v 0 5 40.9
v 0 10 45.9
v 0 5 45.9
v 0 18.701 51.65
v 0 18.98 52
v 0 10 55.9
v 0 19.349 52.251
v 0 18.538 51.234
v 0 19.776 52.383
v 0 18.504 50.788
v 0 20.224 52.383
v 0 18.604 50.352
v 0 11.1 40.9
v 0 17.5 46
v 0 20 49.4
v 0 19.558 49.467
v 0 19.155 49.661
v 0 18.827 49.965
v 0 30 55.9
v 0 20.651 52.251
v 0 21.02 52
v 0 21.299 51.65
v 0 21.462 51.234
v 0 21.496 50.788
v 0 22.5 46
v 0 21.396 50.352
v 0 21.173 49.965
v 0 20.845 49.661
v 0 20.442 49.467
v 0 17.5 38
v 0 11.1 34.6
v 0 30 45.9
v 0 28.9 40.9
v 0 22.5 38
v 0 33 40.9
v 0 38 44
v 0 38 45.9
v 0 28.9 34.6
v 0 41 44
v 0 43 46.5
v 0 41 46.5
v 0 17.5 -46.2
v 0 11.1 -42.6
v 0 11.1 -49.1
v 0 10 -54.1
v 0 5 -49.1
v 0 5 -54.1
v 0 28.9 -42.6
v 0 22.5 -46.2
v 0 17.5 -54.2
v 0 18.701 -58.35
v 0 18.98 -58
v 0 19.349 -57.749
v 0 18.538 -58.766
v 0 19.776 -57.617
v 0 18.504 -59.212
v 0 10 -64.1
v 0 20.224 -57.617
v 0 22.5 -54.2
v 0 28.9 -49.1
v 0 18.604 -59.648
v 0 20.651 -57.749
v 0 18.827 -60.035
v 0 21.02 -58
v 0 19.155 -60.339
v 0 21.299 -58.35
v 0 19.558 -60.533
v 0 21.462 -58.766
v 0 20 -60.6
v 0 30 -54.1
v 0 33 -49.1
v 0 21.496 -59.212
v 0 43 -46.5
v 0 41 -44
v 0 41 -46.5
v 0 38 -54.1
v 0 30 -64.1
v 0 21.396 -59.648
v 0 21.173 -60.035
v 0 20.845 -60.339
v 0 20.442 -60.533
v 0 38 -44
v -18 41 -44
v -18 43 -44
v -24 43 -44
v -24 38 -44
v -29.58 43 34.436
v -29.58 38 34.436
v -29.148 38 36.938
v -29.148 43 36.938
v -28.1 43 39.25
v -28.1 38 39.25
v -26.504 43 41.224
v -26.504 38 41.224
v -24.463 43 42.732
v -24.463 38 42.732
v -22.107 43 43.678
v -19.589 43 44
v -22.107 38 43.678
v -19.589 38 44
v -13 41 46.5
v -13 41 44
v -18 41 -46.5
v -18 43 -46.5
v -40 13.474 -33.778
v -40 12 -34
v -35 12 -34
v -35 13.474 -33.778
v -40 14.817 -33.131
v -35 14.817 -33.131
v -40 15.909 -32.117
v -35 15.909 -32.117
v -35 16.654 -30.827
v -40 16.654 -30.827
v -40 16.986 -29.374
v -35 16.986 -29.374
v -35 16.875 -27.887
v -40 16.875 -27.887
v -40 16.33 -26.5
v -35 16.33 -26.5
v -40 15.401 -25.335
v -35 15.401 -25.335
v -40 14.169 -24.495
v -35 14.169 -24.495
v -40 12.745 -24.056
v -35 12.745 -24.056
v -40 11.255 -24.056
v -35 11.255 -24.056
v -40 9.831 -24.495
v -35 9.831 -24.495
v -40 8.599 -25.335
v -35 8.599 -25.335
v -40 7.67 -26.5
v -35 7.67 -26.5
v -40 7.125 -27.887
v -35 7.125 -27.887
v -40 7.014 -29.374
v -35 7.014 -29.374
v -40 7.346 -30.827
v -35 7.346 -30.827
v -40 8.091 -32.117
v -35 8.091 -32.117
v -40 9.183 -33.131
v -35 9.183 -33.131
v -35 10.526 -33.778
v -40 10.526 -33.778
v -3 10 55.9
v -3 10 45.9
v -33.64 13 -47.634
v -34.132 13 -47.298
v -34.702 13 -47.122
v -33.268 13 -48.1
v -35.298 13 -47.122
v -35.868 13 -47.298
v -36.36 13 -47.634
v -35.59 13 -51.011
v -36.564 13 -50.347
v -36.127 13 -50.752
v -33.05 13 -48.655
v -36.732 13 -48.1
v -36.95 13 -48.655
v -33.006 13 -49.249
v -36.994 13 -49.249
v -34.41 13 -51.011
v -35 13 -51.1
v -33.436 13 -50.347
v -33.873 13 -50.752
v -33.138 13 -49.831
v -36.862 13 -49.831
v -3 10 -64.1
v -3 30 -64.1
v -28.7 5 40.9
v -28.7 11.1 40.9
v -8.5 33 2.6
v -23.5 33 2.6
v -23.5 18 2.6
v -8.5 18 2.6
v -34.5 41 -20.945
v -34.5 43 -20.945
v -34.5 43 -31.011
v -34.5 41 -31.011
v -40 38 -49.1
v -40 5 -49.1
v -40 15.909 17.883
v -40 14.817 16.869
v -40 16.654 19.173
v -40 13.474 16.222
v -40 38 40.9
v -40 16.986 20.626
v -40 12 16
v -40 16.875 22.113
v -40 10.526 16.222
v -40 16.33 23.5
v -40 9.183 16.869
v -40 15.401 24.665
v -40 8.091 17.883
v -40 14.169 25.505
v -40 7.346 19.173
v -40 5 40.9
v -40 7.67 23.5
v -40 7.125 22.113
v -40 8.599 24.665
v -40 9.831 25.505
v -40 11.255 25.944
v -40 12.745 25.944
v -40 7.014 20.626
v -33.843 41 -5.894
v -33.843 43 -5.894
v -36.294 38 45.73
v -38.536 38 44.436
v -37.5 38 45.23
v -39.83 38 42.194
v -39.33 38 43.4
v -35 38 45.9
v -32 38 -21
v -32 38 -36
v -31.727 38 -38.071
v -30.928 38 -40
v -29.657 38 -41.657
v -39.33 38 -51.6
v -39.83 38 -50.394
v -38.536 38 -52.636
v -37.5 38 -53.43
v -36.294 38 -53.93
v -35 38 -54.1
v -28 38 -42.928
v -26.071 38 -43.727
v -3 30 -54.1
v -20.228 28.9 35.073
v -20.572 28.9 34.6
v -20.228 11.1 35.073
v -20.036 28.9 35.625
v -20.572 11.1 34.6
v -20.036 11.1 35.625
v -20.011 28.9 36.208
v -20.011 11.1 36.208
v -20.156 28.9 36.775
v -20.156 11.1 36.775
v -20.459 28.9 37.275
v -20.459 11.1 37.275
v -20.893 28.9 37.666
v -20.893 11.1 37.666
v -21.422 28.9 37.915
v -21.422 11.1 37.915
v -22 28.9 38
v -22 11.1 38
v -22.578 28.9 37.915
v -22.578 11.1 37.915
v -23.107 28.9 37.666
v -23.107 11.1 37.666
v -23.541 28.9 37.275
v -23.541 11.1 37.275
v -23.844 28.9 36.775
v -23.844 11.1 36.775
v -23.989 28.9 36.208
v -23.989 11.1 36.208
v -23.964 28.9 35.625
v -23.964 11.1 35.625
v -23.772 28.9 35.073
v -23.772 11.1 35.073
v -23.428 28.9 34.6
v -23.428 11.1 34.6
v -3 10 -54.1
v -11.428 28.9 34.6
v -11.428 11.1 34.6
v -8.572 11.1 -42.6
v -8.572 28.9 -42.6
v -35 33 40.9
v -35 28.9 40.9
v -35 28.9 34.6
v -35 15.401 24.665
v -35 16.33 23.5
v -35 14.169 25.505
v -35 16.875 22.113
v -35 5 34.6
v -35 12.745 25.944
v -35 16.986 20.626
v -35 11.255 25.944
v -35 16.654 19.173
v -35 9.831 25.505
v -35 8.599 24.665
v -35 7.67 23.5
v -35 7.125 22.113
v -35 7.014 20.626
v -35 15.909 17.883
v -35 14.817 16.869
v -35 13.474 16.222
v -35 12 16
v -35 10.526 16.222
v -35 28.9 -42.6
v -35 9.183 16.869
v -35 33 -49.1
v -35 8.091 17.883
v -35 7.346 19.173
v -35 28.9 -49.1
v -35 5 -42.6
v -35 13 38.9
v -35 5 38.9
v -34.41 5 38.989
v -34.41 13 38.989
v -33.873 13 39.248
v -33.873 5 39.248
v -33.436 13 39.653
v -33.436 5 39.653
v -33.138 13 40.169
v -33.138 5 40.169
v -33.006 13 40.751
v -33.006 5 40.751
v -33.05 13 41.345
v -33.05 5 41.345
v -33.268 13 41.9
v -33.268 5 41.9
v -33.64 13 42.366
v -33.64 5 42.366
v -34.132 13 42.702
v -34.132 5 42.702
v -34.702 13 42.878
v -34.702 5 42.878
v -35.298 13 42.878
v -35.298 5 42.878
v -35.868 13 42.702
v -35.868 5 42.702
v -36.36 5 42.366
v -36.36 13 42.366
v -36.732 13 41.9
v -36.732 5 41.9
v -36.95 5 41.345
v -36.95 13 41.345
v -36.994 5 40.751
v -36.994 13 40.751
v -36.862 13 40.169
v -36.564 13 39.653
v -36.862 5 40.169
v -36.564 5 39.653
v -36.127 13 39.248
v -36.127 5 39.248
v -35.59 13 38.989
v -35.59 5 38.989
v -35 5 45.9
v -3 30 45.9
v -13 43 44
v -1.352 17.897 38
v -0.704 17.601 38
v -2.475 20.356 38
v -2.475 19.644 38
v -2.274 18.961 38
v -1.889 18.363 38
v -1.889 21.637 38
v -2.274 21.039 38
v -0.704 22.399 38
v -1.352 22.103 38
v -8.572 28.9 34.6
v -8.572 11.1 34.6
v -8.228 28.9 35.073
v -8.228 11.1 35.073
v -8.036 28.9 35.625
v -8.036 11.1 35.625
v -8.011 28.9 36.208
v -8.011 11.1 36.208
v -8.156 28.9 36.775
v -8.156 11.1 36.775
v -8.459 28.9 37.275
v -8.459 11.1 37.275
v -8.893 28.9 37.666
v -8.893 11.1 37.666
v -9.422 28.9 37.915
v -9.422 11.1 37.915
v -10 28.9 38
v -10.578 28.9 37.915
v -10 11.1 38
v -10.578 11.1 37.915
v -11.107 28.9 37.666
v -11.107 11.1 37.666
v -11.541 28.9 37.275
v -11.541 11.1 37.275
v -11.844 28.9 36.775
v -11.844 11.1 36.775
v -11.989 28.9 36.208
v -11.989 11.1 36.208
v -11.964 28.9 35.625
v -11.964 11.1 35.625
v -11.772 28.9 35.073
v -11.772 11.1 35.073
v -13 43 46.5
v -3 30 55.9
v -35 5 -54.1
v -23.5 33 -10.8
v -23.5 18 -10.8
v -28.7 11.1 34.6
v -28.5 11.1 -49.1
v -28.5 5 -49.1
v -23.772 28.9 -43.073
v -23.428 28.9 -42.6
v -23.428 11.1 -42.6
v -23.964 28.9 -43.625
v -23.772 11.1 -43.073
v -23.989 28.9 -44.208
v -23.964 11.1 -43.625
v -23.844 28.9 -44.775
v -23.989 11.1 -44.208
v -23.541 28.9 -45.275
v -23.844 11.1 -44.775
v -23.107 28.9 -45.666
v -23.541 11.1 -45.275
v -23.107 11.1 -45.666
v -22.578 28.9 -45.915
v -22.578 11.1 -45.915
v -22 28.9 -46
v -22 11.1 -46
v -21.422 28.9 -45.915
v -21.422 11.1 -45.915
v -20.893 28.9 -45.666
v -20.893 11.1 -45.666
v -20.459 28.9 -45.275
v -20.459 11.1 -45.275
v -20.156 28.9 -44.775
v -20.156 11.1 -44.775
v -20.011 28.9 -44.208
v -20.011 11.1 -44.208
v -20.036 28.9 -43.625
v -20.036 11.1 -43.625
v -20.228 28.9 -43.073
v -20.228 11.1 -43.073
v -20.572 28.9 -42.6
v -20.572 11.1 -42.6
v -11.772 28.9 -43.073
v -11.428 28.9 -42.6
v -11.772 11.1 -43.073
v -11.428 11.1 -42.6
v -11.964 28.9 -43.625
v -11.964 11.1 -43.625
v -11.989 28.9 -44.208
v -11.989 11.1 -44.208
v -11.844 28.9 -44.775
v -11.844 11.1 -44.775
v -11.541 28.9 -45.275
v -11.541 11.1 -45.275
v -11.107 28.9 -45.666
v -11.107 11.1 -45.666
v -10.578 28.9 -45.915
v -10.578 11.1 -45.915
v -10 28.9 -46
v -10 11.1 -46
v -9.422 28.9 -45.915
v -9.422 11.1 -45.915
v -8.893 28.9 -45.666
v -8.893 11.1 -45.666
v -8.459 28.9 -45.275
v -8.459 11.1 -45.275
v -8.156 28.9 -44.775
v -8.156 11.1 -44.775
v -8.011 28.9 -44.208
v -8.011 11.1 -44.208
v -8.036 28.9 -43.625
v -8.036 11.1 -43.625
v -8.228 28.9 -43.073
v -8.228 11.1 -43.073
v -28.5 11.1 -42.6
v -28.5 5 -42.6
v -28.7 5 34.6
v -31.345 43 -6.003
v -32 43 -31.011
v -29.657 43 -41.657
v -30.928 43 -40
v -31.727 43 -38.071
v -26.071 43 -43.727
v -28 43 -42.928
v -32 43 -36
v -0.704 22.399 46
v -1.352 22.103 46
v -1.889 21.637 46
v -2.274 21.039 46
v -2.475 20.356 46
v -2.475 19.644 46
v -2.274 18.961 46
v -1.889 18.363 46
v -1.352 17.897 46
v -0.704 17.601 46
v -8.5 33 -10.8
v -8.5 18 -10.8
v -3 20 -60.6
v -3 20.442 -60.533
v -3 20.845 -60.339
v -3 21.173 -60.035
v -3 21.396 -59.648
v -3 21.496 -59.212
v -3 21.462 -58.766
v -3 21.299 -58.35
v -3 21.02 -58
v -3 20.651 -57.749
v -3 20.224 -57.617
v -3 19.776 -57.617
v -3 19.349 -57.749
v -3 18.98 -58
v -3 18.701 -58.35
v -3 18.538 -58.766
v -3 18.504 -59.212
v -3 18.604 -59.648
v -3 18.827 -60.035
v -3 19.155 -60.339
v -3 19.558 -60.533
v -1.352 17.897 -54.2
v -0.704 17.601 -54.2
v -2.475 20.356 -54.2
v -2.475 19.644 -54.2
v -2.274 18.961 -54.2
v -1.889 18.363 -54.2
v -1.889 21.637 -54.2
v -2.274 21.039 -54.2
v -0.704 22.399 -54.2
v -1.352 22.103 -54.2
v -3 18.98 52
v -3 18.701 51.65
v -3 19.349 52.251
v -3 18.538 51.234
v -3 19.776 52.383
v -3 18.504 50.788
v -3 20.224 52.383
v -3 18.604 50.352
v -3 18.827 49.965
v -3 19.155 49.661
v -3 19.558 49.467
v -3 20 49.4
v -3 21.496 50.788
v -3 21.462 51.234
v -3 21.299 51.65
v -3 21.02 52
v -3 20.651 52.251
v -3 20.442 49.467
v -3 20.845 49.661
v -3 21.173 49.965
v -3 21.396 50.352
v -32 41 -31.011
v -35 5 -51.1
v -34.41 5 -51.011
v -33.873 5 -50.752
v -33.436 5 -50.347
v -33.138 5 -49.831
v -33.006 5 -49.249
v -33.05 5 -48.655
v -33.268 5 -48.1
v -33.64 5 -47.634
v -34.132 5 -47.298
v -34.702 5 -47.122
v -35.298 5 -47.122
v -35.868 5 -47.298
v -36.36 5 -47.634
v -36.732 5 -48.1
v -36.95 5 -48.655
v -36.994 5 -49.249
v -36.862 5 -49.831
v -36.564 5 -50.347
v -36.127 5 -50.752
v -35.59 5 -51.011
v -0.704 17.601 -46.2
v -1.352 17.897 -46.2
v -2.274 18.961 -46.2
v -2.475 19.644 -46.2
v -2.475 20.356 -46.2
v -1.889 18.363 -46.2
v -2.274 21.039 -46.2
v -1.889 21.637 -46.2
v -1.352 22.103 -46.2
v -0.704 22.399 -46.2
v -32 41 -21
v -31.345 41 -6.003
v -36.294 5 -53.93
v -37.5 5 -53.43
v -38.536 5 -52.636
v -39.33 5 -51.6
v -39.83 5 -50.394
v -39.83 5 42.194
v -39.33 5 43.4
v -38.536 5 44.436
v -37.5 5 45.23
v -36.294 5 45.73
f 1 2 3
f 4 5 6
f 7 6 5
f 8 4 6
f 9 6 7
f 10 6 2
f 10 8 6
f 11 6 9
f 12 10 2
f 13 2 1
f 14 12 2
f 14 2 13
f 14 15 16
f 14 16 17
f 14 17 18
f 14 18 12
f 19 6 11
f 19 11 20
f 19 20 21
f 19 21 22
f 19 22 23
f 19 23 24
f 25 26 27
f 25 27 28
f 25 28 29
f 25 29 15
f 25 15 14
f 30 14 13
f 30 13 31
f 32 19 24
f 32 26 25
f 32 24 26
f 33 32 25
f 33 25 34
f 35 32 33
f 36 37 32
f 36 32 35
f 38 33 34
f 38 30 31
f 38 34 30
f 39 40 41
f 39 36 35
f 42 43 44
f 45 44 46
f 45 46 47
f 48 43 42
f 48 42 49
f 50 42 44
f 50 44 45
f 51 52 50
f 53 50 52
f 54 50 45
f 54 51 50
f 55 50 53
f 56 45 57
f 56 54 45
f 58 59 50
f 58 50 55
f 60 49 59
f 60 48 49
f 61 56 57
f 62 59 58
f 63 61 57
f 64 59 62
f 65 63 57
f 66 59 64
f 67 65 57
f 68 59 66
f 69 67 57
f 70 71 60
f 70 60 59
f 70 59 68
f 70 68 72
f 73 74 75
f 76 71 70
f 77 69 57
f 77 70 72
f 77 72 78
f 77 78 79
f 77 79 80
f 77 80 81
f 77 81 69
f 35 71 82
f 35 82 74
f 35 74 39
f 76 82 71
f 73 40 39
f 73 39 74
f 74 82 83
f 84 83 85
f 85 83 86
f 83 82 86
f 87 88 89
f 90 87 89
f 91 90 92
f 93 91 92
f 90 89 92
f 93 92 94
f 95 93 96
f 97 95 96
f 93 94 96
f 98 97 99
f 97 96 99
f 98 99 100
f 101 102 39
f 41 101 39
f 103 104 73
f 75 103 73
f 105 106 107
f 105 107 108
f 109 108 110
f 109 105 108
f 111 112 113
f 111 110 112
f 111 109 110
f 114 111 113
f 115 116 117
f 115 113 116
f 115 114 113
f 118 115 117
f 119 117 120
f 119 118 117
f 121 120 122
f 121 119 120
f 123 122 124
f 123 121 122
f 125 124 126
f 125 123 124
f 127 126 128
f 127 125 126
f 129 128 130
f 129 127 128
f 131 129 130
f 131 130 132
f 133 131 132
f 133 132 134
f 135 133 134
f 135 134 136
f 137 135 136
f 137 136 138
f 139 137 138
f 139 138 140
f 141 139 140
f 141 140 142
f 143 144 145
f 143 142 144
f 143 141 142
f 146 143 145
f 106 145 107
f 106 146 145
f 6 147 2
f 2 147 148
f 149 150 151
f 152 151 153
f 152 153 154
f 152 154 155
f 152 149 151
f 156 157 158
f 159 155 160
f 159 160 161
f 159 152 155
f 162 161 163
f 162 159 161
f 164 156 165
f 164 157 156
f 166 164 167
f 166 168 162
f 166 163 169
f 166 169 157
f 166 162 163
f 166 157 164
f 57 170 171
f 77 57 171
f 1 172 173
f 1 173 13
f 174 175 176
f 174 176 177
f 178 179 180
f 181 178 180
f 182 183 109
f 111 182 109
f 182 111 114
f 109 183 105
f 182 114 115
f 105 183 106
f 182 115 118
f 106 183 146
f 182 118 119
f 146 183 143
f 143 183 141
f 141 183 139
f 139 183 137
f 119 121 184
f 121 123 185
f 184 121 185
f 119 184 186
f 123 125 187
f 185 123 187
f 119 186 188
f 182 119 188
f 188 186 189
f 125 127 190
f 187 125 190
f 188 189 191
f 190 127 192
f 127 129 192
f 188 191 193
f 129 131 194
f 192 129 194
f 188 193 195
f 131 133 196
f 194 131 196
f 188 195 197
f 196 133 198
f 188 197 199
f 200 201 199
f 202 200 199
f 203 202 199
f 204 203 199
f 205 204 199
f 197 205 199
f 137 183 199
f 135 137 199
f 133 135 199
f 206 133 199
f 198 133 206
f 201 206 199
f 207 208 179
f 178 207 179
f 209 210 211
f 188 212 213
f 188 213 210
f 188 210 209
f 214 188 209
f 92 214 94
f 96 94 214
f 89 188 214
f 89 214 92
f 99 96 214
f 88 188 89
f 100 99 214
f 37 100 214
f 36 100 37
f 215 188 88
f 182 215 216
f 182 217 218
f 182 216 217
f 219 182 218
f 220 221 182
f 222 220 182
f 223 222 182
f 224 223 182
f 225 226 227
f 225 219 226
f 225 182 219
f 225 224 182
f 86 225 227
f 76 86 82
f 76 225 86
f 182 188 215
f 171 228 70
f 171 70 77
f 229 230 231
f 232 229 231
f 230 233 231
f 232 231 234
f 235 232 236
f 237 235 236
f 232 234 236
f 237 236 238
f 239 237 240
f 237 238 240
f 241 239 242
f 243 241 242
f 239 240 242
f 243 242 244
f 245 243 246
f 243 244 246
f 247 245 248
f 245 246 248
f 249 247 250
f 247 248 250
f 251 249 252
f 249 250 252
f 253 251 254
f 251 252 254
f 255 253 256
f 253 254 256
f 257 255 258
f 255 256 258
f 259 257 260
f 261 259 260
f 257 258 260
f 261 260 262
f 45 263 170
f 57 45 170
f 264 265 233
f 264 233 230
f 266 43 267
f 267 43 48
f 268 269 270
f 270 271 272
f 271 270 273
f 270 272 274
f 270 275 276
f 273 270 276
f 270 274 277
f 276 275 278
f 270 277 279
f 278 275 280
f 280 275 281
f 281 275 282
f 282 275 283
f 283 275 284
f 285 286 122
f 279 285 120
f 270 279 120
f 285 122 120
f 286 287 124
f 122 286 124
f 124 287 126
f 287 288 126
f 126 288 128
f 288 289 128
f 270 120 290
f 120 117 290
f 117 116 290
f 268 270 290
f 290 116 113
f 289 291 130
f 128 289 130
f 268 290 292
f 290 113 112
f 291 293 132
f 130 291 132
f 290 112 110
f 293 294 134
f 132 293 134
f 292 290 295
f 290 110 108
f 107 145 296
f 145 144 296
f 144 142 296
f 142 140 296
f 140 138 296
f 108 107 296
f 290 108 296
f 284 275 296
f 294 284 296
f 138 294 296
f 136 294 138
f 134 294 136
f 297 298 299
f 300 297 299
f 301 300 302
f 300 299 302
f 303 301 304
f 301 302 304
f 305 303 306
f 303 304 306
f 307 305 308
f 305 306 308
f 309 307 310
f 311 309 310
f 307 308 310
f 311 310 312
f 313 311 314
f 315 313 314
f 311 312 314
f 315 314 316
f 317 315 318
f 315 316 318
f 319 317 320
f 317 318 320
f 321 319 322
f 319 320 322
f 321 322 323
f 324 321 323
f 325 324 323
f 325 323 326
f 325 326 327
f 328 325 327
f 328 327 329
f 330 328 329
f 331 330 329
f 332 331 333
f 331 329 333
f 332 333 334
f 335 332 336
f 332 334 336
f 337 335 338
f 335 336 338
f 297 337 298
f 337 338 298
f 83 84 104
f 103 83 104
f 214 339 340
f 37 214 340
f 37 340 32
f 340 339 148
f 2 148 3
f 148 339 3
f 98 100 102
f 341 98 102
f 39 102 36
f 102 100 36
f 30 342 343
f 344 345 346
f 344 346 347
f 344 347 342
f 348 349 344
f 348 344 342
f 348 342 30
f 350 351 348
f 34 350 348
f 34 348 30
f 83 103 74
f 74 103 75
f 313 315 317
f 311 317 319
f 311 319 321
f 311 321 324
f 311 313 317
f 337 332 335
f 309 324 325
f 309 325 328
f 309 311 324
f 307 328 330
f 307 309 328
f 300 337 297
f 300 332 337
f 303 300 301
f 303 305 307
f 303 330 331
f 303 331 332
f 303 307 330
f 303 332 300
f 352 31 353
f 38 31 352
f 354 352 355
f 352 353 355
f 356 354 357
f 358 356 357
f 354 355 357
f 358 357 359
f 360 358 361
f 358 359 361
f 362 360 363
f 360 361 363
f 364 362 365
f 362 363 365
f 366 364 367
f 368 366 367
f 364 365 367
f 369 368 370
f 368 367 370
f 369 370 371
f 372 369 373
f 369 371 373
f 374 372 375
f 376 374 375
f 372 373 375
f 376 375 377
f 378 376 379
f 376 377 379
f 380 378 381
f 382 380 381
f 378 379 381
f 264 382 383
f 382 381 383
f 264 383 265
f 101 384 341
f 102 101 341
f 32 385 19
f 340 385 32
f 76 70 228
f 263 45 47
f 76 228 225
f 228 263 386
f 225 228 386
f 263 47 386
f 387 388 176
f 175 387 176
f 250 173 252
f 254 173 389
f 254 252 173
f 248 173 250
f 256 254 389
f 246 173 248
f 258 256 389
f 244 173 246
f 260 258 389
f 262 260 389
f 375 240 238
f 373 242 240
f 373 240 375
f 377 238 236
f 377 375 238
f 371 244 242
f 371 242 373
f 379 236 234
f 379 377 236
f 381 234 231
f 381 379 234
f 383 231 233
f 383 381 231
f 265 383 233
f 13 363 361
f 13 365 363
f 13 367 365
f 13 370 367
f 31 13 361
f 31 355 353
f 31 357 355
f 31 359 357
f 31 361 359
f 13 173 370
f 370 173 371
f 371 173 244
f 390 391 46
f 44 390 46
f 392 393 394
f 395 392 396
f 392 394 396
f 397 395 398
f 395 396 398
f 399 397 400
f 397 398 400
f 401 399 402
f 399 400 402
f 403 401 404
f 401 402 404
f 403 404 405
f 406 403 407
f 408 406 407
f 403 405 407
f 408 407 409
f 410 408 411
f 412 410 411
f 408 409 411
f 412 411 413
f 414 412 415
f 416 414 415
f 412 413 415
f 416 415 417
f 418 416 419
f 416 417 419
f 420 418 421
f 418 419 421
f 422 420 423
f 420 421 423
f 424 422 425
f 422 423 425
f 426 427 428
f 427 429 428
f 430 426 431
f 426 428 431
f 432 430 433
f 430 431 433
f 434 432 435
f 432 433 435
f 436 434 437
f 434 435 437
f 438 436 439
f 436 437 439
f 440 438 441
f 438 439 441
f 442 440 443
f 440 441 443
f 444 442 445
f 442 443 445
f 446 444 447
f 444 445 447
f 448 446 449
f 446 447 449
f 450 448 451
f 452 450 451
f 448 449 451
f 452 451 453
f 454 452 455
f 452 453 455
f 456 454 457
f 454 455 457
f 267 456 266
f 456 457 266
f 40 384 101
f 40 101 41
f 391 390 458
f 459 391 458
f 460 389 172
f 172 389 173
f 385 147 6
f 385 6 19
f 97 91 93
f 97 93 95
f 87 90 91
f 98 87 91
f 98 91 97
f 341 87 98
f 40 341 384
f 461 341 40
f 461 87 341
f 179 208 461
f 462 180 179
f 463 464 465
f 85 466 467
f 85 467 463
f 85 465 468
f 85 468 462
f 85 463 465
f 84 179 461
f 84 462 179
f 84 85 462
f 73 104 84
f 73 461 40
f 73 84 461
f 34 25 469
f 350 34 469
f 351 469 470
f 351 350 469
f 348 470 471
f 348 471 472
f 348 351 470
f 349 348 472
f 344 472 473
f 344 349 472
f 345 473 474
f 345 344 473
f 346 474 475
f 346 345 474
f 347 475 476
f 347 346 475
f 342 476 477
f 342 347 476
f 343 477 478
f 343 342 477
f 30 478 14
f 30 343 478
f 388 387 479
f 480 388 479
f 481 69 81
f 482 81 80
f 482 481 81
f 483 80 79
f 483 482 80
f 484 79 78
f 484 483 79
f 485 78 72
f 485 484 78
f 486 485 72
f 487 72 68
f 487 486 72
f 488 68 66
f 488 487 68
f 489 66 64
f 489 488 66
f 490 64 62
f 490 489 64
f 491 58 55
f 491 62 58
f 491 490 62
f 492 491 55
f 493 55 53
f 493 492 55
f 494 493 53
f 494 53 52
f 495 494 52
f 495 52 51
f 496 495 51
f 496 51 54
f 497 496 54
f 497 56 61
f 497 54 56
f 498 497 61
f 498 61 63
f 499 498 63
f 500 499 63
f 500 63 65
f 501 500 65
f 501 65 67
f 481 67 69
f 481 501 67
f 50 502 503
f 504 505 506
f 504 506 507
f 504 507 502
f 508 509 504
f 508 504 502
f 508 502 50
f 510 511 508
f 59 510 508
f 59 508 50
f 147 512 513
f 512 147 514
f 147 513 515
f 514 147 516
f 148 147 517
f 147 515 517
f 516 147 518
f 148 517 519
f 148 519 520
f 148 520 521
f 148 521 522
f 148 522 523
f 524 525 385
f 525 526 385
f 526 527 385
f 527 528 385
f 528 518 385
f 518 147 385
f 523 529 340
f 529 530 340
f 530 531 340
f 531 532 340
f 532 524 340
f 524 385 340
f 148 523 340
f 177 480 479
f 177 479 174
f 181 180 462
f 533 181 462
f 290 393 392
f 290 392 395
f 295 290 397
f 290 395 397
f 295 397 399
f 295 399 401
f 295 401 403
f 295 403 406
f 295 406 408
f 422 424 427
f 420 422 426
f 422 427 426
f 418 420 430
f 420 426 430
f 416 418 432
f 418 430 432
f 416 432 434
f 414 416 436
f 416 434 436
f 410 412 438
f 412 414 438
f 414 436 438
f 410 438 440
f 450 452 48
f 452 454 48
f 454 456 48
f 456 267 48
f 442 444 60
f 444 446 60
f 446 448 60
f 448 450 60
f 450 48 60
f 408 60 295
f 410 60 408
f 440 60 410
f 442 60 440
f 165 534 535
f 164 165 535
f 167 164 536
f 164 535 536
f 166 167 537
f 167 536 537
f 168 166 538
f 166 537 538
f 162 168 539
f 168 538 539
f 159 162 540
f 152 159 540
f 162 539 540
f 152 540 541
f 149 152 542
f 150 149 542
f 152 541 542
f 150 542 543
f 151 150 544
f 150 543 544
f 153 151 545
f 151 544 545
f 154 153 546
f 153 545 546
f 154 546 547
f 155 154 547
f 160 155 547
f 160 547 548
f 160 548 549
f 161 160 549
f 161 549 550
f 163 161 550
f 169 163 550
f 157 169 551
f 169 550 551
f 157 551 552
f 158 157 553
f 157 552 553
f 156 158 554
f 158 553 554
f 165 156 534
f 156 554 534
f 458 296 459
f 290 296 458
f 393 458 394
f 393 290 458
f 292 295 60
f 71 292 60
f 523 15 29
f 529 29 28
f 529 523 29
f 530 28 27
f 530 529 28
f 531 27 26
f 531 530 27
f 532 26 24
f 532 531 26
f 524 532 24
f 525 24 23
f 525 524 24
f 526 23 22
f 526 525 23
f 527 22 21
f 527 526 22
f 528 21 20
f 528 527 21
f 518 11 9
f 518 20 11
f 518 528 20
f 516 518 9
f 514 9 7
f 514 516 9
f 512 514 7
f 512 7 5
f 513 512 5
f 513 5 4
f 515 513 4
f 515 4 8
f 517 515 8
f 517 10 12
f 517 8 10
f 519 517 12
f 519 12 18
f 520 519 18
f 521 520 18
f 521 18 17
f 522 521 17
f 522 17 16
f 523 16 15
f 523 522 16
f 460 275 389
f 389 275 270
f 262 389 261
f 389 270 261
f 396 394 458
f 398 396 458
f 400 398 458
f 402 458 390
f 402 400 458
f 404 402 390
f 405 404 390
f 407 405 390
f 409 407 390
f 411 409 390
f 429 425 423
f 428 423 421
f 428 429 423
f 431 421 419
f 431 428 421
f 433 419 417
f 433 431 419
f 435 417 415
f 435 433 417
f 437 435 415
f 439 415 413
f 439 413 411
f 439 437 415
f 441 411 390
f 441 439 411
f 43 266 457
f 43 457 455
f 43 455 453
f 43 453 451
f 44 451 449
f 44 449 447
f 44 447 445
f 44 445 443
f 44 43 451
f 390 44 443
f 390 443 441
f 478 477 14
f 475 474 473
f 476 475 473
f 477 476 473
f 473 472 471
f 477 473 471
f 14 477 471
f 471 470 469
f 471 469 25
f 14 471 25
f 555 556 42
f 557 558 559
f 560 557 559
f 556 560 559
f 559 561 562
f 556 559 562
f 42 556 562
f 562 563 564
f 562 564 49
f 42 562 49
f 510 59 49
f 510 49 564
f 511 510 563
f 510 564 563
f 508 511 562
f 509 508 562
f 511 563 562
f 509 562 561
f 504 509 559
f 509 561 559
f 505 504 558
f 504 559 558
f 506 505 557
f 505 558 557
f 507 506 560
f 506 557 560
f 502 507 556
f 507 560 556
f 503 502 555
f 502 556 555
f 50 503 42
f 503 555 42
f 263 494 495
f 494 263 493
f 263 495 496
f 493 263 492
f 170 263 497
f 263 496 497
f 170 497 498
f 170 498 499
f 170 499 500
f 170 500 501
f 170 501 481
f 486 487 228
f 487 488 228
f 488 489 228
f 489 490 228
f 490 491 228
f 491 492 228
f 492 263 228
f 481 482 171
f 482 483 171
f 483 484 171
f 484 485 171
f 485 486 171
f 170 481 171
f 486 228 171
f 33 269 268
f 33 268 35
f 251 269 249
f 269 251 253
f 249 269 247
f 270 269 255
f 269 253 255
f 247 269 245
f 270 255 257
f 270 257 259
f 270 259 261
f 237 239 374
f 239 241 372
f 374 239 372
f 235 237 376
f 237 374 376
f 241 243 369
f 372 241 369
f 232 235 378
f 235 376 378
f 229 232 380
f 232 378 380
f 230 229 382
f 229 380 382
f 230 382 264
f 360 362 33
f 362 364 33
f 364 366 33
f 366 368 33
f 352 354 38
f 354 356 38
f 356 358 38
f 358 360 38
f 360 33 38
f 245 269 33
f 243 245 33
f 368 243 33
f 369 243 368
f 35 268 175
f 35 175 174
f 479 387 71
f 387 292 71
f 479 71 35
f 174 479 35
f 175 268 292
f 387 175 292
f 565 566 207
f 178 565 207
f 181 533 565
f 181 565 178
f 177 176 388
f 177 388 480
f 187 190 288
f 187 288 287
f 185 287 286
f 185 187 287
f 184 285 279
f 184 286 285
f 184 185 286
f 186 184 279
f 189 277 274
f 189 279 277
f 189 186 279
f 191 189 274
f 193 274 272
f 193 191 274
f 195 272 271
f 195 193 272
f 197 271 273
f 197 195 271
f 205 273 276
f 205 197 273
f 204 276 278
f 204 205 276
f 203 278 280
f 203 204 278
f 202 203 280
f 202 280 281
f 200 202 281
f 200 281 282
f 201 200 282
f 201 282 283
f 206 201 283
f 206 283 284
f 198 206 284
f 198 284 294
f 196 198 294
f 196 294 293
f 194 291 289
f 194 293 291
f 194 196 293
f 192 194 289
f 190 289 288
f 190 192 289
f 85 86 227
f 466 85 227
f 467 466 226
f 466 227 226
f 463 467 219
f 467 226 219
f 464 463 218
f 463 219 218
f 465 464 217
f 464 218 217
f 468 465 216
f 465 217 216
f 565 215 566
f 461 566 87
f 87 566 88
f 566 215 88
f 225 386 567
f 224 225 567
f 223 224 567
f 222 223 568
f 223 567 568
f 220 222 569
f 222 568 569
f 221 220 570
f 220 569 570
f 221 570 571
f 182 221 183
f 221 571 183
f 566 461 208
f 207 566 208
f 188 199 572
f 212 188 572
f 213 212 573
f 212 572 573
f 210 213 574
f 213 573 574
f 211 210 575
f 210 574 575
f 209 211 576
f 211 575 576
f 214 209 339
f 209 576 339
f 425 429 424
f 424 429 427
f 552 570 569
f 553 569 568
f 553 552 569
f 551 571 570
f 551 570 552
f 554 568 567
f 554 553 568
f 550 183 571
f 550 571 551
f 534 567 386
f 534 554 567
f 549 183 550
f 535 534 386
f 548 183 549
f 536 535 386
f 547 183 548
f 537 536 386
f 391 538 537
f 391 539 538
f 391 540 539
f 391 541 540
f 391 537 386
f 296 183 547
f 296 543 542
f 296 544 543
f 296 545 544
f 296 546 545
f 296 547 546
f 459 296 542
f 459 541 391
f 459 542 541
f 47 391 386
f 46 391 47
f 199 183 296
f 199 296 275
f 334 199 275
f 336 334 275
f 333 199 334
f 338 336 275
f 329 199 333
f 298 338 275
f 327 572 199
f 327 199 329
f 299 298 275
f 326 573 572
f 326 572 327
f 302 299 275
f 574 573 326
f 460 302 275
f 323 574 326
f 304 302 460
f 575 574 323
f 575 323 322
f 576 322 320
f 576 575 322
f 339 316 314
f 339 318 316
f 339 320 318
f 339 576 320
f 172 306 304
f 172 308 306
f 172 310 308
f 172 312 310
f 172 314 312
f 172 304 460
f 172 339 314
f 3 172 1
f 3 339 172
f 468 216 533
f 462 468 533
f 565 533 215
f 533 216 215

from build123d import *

# Parameters (mm, degrees)
SKETCH8_R                        = 10
BOSS_EXTRUDE6_DEPTH              = 5
BOSS_EXTRUDE7_START              = 5
BOSS_EXTRUDE7_DEPTH              = 5
EXTRUDE_THIN4_DEPTH              = 8
EXTRUDE_THIN4_DEPTH_BACK         = 20
SKETCH2_W                        = 70
SKETCH2_H                        = 90
BOSS_EXTRUDE8_DEPTH              = 5
BOSS_EXTRUDE9_DEPTH              = 5
BOSS_EXTRUDE10_REACH             = 81.849
SKETCH13_W                       = 6.5
SKETCH13_H                       = 17.8
SKETCH13_W_2                     = 6.3
BOSS_EXTRUDE10_DIRECTION_2_REACH = 81.849
SKETCH15_R                       = 2
CUT_EXTRUDE1_DEPTH               = 17.8
SKETCH17_W                       = 36
SKETCH17_H                       = 3
SKETCH17_W_2                     = 26
BOSS_EXTRUDE11_DEPTH             = 2
SKETCH18_W                       = 36
SKETCH18_H                       = 3
SKETCH18_W_2                     = 26
BOSS_EXTRUDE12_DEPTH             = 2
BOSS_EXTRUDE13_DEPTH             = 3
BOSS_EXTRUDE13_DEPTH_BACK        = 3
SKETCH19_W                       = 10
SKETCH19_H                       = 20
SKETCH19_R                       = 1.5
SKETCH21_R                       = 2.5
CUT_EXTRUDE5_DEPTH               = 8
SKETCH23_R                       = 2.5
CUT_EXTRUDE6_DEPTH               = 8
SKETCH24_W                       = 150
SKETCH24_H                       = 150
CUT_EXTRUDE7_DEPTH               = 85.574286873
SKETCH25_W                       = 150
SKETCH25_H                       = 150
CUT_EXTRUDE8_DEPTH               = 87.935665869
SKETCH26_W                       = 6.3
SKETCH26_H                       = 6.3
SKETCH26_W_2                     = 6.5
SKETCH26_H_2                     = 6.5
BOSS_EXTRUDE14_DEPTH             = 6.1
SKETCH27_R                       = 2
CUT_EXTRUDE9_DEPTH               = 8
SKETCH28_W                       = 15
SKETCH28_H                       = 13.4
BOSS_EXTRUDE15_DEPTH             = 15
CUT_EXTRUDE10_DEPTH              = 87.935665869
CUT_EXTRUDE10_DEPTH_BACK         = 87.935665869
SKETCH29_R                       = 5


with BuildPart() as part:
    # Sketch8 → Boss-Extrude6 (new body)
    with BuildSketch(Plane(origin=(0, 0, 0), x_dir=(-1, 0, 0), z_dir=(0, 1, 0))):
        with BuildLine():
            Line((32, -36), (32, -21))
            Line((32, -21), (29.579603504, 34.436193874))
            ThreePointArc((29.579603504, 34.436193874), (26.504251846, 41.223639621), (19.589121288, 44))
            Line((19.589121288, 44), (-19.589121288, 44))
            ThreePointArc((-19.589121288, 44), (-26.504251846, 41.223639621), (-29.579603504, 34.436193874))
            Line((-29.579603504, 34.436193874), (-32, -21))
            Line((-32, -21), (-32, -36))
            ThreePointArc((-32, -36), (-29.656854249, -41.656854249), (-24, -44))
            Line((-24, -44), (24, -44))
            ThreePointArc((24, -44), (29.656854249, -41.656854249), (32, -36))
        make_face()
        with Locations(Location((15.9, 11.8, 0), (0, 0, 90))):
            Circle(SKETCH8_R, mode=Mode.SUBTRACT)
        with Locations(Location((-15.9, 11.8, 0), (0, 0, 90))):
            Circle(SKETCH8_R, mode=Mode.SUBTRACT)
        with Locations(Location((15.9, -20, 0), (0, 0, 90))):
            Circle(SKETCH8_R, mode=Mode.SUBTRACT)
        with Locations(Location((-15.9, -20, 0), (0, 0, 90))):
            Circle(SKETCH8_R, mode=Mode.SUBTRACT)
    extrude(amount=-BOSS_EXTRUDE6_DEPTH)

    # Sketch1 → Boss-Extrude7 (add)
    # profile 1 of 2: a face of its own
    with BuildSketch(Plane(origin=(0, 0, 0), x_dir=(1, 0, 0), z_dir=(0, 1, 0)).offset(BOSS_EXTRUDE7_START)):
        with BuildLine():
            Line((-35, 54.1), (35, 54.1))
            ThreePointArc((35, 54.1), (38.535533906, 52.635533906), (40, 49.1))
            Line((40, 49.1), (40, -40.9))
            ThreePointArc((40, -40.9), (38.535533906, -44.435533906), (35, -45.9))
            Line((35, -45.9), (-35, -45.9))
            ThreePointArc((-35, -45.9), (-38.535533906, -44.435533906), (-40, -40.9))
            Line((-40, -40.9), (-40, 49.1))
            ThreePointArc((-40, 49.1), (-38.535533906, 52.635533906), (-35, 54.1))
        make_face()
        with BuildLine():
            ThreePointArc((32, 36), (29.656854249, 41.656854249), (24, 44))
            Line((24, 44), (-24, 44))
            ThreePointArc((-24, 44), (-29.656854249, 41.656854249), (-32, 36))
            Line((-32, 36), (-32, 21))
            Line((-32, 21), (-29.579603504, -34.436193874))
            ThreePointArc((-29.579603504, -34.436193874), (-26.504251846, -41.223639621), (-19.589121288, -44))
            Line((-19.589121288, -44), (19.589121288, -44))
            ThreePointArc((19.589121288, -44), (26.504251846, -41.223639621), (29.579603504, -34.436193874))
            Line((29.579603504, -34.436193874), (32, 21))
            Line((32, 21), (32, 36))
        make_face(mode=Mode.SUBTRACT)
    # profile 2 of 2: a face of its own
    with BuildSketch(Plane(origin=(0, 0, 0), x_dir=(1, 0, 0), z_dir=(0, 1, 0)).offset(BOSS_EXTRUDE7_START)):
        with BuildLine():
            Line((32, 36), (32, 21))
            Line((32, 21), (29.579603504, -34.436193874))
            ThreePointArc((29.579603504, -34.436193874), (26.504251846, -41.223639621), (19.589121288, -44))
            Line((19.589121288, -44), (-19.589121288, -44))
            ThreePointArc((-19.589121288, -44), (-26.504251846, -41.223639621), (-29.579603504, -34.436193874))
            Line((-29.579603504, -34.436193874), (-32, 21))
            Line((-32, 21), (-32, 36))
            ThreePointArc((-32, 36), (-29.656854249, 41.656854249), (-24, 44))
            Line((-24, 44), (24, 44))
            ThreePointArc((24, 44), (29.656854249, 41.656854249), (32, 36))
        make_face()
        with BuildLine():
            ThreePointArc((-24, 41), (-27.535533906, 39.535533906), (-29, 36))
            Line((-29, 36), (-29, 21.065460233))
            Line((-29, 21.065460233), (-26.582458839, -34.305335712))
            ThreePointArc((-26.582458839, -34.305335712), (-24.429712679, -39.056547734), (-19.589121288, -41))
            Line((-19.589121288, -41), (19.589121288, -41))
            ThreePointArc((19.589121288, -41), (24.429712679, -39.056547734), (26.582458839, -34.305335712))
            Line((26.582458839, -34.305335712), (29, 21.065460233))
            Line((29, 21.065460233), (29, 36))
            ThreePointArc((29, 36), (27.535533906, 39.535533906), (24, 41))
            Line((24, 41), (-24, 41))
        make_face(mode=Mode.SUBTRACT)
    extrude(amount=-BOSS_EXTRUDE7_DEPTH)

    # Sketch17 → Boss-Extrude11 (add)
    with BuildSketch(Plane(origin=(0, -5, 0), x_dir=(1, 0, 0), z_dir=(0, 1, 0))):
        with Locations((0, 45)):
            Rectangle(SKETCH17_W, SKETCH17_H)
        with Locations((0, -45)):
            Rectangle(SKETCH17_W_2, SKETCH17_H)
        Polygon((-31.5, 21.010910039), (-30.84570919, 6.025186715), (-33.842853854, 5.894328553), (-34.5, 20.945449806), (-34.5, 31.010910039), (-31.5, 31.010910039), align=None)
        Polygon((31.5, 21.010910039), (31.5, 31.010910039), (34.5, 31.010910039), (34.5, 20.945449806), (33.842853854, 5.894328553), (30.84570919, 6.025186715), align=None)
    extrude(amount=BOSS_EXTRUDE11_DEPTH)

    # Sketch24 → Cut-Extrude7 (cut, through all)
    with BuildSketch(Plane(origin=(0, 5, 0), x_dir=(1, 0, 0), z_dir=(0, 1, 0))):
        Rectangle(SKETCH24_W, SKETCH24_H)
    extrude(amount=-CUT_EXTRUDE7_DEPTH, mode=Mode.SUBTRACT)


with BuildPart() as body_2:
    # Sketch2 → Extrude-Thin4 (new, two sides: drawn at the far end of the back side and taken through both)
    with BuildSketch(Plane(origin=(0, 25, 0), x_dir=(1, 0, 0), z_dir=(0, 1, 0)).offset(-EXTRUDE_THIN4_DEPTH_BACK)):
        with BuildLine():
            Line((-40, 49.1), (-40, -40.9))
            ThreePointArc((-40, -40.9), (-38.535533906, -44.435533906), (-35, -45.9))
            Line((-35, -45.9), (35, -45.9))
            ThreePointArc((35, -45.9), (38.535533906, -44.435533906), (40, -40.9))
            Line((40, -40.9), (40, 49.1))
            ThreePointArc((40, 49.1), (38.535533906, 52.635533906), (35, 54.1))
            Line((35, 54.1), (-35, 54.1))
            ThreePointArc((-35, 54.1), (-38.535533906, 52.635533906), (-40, 49.1))
        make_face()
        with Locations((0, 4.1)):
            Rectangle(SKETCH2_W, SKETCH2_H, mode=Mode.SUBTRACT)
    extrude(amount=EXTRUDE_THIN4_DEPTH + EXTRUDE_THIN4_DEPTH_BACK)

    # Sketch13 → Boss-Extrude10 (add, up to next)
    with BuildSketch(Plane(origin=(0, 0, 0), x_dir=(0, 0, -1), z_dir=(1, 0, 0)), mode=Mode.PRIVATE) as boss_extrude10_sk1:
        with Locations((45.85, 20)):
            Rectangle(SKETCH13_W, SKETCH13_H)
    boss_extrude10_tool1 = extrude(boss_extrude10_sk1.sketch, amount=BOSS_EXTRUDE10_REACH, mode=Mode.PRIVATE) - body_2.part
    # Sketch13 → Boss-Extrude10 (add, up to next)
    with BuildSketch(Plane(origin=(0, 0, 0), x_dir=(0, 0, -1), z_dir=(1, 0, 0)), mode=Mode.PRIVATE) as boss_extrude10_sk2:
        with Locations((-37.75, 20)):
            Rectangle(SKETCH13_W_2, SKETCH13_H)
    boss_extrude10_tool2 = extrude(boss_extrude10_sk2.sketch, amount=BOSS_EXTRUDE10_REACH, mode=Mode.PRIVATE) - body_2.part
    add(boss_extrude10_tool1.solids().sort_by_distance((0, 20, -45.85))[0])
    add(boss_extrude10_tool2.solids().sort_by_distance((0, 20, 37.75))[0])

    # Sketch13 → Boss-Extrude10 direction 2 (add, up to next)
    with BuildSketch(Plane(origin=(0, 0, 0), x_dir=(0, 0, -1), z_dir=(1, 0, 0)), mode=Mode.PRIVATE) as boss_extrude10_direction_2_sk1:
        with Locations((45.85, 20)):
            Rectangle(SKETCH13_W, SKETCH13_H)
    boss_extrude10_direction_2_tool1 = extrude(boss_extrude10_direction_2_sk1.sketch, amount=-BOSS_EXTRUDE10_DIRECTION_2_REACH, mode=Mode.PRIVATE) - body_2.part
    # Sketch13 → Boss-Extrude10 direction 2 (add, up to next)
    with BuildSketch(Plane(origin=(0, 0, 0), x_dir=(0, 0, -1), z_dir=(1, 0, 0)), mode=Mode.PRIVATE) as boss_extrude10_direction_2_sk2:
        with Locations((-37.75, 20)):
            Rectangle(SKETCH13_W_2, SKETCH13_H)
    boss_extrude10_direction_2_tool2 = extrude(boss_extrude10_direction_2_sk2.sketch, amount=-BOSS_EXTRUDE10_DIRECTION_2_REACH, mode=Mode.PRIVATE) - body_2.part
    add(boss_extrude10_direction_2_tool1.solids().sort_by_distance((0, 20, -45.85))[0])
    add(boss_extrude10_direction_2_tool2.solids().sort_by_distance((0, 20, 37.75))[0])

    # Sketch15 → Cut-Extrude1 (cut)
    with BuildSketch(Plane.XZ.offset(-11.1)):
        with Locations((-22, -44)):
            Circle(SKETCH15_R)
        with Locations((-10, -44)):
            Circle(SKETCH15_R)
        with Locations((-22, 36)):
            Circle(SKETCH15_R)
        with Locations((-10, 36)):
            Circle(SKETCH15_R)
        with Locations((10, 36)):
            Circle(SKETCH15_R)
        with Locations((22, 36)):
            Circle(SKETCH15_R)
        with Locations((10, -44)):
            Circle(SKETCH15_R)
        with Locations((22, -44)):
            Circle(SKETCH15_R)
    extrude(amount=-CUT_EXTRUDE1_DEPTH, mode=Mode.SUBTRACT)

    # Sketch19 → Boss-Extrude13 (add, two sides: drawn at the far end of the back side and taken through both)
    # profile 1 of 2: a face of its own
    with BuildSketch(Plane(origin=(0, 0, 0), x_dir=(0, 0, -1), z_dir=(1, 0, 0)).offset(-BOSS_EXTRUDE13_DEPTH_BACK)):
        with Locations((-50.9, 20)):
            Rectangle(SKETCH19_W, SKETCH19_H)
        with Locations((-50.9, 20)):
            Circle(SKETCH19_R, mode=Mode.SUBTRACT)
    # profile 2 of 2: a face of its own
    with BuildSketch(Plane(origin=(0, 0, 0), x_dir=(0, 0, -1), z_dir=(1, 0, 0)).offset(-BOSS_EXTRUDE13_DEPTH_BACK)):
        with Locations((59.1, 20)):
            Rectangle(SKETCH19_W, SKETCH19_H)
        with Locations((59.1, 20)):
            Circle(SKETCH19_R, mode=Mode.SUBTRACT)
    extrude(amount=BOSS_EXTRUDE13_DEPTH + BOSS_EXTRUDE13_DEPTH_BACK)

    # Sketch21 → Cut-Extrude5 (cut)
    with BuildSketch(Plane.XY.offset(38)):
        with Locations((0, 20)):
            Circle(SKETCH21_R)
    extrude(amount=CUT_EXTRUDE5_DEPTH, mode=Mode.SUBTRACT)

    # Sketch23 → Cut-Extrude6 (cut)
    with BuildSketch(Plane.XY.offset(-46.2)):
        with Locations((0, 20)):
            Circle(SKETCH23_R)
    extrude(amount=-CUT_EXTRUDE6_DEPTH, mode=Mode.SUBTRACT)


with BuildPart() as body_3:
    # Sketch10 → Boss-Extrude8 (new body)
    with BuildSketch(Plane(origin=(0, 38, 0), x_dir=(1, 0, 0), z_dir=(0, 1, 0))):
        with BuildLine():
            Line((-32, 36), (-32, 21))
            Line((-32, 21), (-29.579603504, -34.436193874))
            ThreePointArc((-29.579603504, -34.436193874), (-26.504251846, -41.223639621), (-19.589121288, -44))
            Line((-19.589121288, -44), (19.589121288, -44))
            ThreePointArc((19.589121288, -44), (26.504251846, -41.223639621), (29.579603504, -34.436193874))
            Line((29.579603504, -34.436193874), (32, 21))
            Line((32, 21), (32, 36))
            ThreePointArc((32, 36), (29.656854249, 41.656854249), (24, 44))
            Line((24, 44), (-24, 44))
            ThreePointArc((-24, 44), (-29.656854249, 41.656854249), (-32, 36))
        make_face()
    extrude(amount=BOSS_EXTRUDE8_DEPTH)

    # Sketch11 → Boss-Extrude9 (add)
    with BuildSketch(Plane(origin=(0, 38, 0), x_dir=(1, 0, 0), z_dir=(0, 1, 0))):
        with BuildLine():
            Line((-35, -45.9), (35, -45.9))
            ThreePointArc((35, -45.9), (38.535533906, -44.435533906), (40, -40.9))
            Line((40, -40.9), (40, 49.1))
            ThreePointArc((40, 49.1), (38.535533906, 52.635533906), (35, 54.1))
            Line((35, 54.1), (-35, 54.1))
            ThreePointArc((-35, 54.1), (-38.535533906, 52.635533906), (-40, 49.1))
            Line((-40, 49.1), (-40, -40.9))
            ThreePointArc((-40, -40.9), (-38.535533906, -44.435533906), (-35, -45.9))
        make_face()
    extrude(amount=-BOSS_EXTRUDE9_DEPTH)

    # Sketch18 → Boss-Extrude12 (add)
    with BuildSketch(Plane(origin=(0, 43, 0), x_dir=(1, 0, 0), z_dir=(0, 1, 0))):
        with Locations((0, 45)):
            Rectangle(SKETCH18_W, SKETCH18_H)
        with Locations((0, -45)):
            Rectangle(SKETCH18_W_2, SKETCH18_H)
        Polygon((-31.5, 21.010910039), (-30.84570919, 6.025186715), (-33.842853854, 5.894328553), (-34.5, 20.945449806), (-34.5, 31.010910039), (-31.5, 31.010910039), align=None)
        Polygon((31.5, 21.010910039), (31.5, 31.010910039), (34.5, 31.010910039), (34.5, 20.945449806), (33.842853854, 5.894328553), (30.84570919, 6.025186715), align=None)
    extrude(amount=-BOSS_EXTRUDE12_DEPTH)


with BuildPart() as cut_extrude8_tool:
    # Sketch25 → Cut-Extrude8 (new, through all)
    with BuildSketch(Plane(origin=(0, 0, 0), x_dir=(0, 0, -1), z_dir=(1, 0, 0))):
        Rectangle(SKETCH25_W, SKETCH25_H)
    extrude(amount=CUT_EXTRUDE8_DEPTH)


with BuildPart() as body_2_1:
    add(body_2.part)

    # Cut-Extrude8: cut by cut_extrude8_tool
    add(cut_extrude8_tool.part, mode=Mode.SUBTRACT)

    # Sketch26 → Boss-Extrude14 (add)
    with BuildSketch(Plane.XZ.offset(-11.1)):
        with Locations((-31.85, 37.75)):
            Rectangle(SKETCH26_W, SKETCH26_H)
        with Locations((-31.75, -45.85)):
            Rectangle(SKETCH26_W_2, SKETCH26_H_2)
    extrude(amount=BOSS_EXTRUDE14_DEPTH)

    # Sketch27 → Cut-Extrude9 (cut)
    with BuildSketch(Plane.XZ.offset(-5)):
        with Locations(Location((-35, 40.9, 0), (0, 0, 270))):
            Circle(SKETCH27_R)
        with Locations(Location((-35, -49.1, 0), (0, 0, 270))):
            Circle(SKETCH27_R)
    extrude(amount=-CUT_EXTRUDE9_DEPTH, mode=Mode.SUBTRACT)


with BuildPart() as body_3_1:
    add(body_3.part)

    # Cut-Extrude8: cut by cut_extrude8_tool
    add(cut_extrude8_tool.part, mode=Mode.SUBTRACT)


    add(body_2_1.part)  # Boss-Extrude15 merges body 2
    # Sketch28 → Boss-Extrude15 (add)
    with BuildSketch(Plane.XZ.offset(-33)):
        with Locations((-16, -4.1)):
            Rectangle(SKETCH28_W, SKETCH28_H)
    extrude(amount=BOSS_EXTRUDE15_DEPTH)

    # Sketch29 → Cut-Extrude10 (cut, two sides: drawn at the far end of the back side and taken through both)
    with BuildSketch(Plane(origin=(0, 0, 0), x_dir=(0, 0, -1), z_dir=(1, 0, 0)).offset(-CUT_EXTRUDE10_DEPTH_BACK)):
        with Locations((-21, 12)):
            Circle(SKETCH29_R)
        with Locations((29, 12)):
            Circle(SKETCH29_R)
    extrude(amount=CUT_EXTRUDE10_DEPTH + CUT_EXTRUDE10_DEPTH_BACK, mode=Mode.SUBTRACT)


solid = body_3_1.part
